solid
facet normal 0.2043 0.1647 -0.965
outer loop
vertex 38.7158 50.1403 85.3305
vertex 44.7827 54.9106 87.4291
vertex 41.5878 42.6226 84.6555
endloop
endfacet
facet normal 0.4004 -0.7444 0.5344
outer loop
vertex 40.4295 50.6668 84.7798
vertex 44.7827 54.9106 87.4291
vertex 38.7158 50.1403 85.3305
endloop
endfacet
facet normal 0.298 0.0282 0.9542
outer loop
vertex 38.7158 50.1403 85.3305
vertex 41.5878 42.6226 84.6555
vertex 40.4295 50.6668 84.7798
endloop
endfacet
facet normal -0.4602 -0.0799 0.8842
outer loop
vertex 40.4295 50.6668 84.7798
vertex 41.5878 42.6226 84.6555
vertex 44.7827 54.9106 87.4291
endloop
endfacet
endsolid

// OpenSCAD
// Auto-generated auxetic polyhedron
points = [
    [41.587840, 42.622578, 84.655544],
    [44.782667, 54.910586, 87.429125],
    [38.715839, 50.140302, 85.330507],
    [40.429495, 50.666800, 84.779780],
];

faces = [
    [0, 1, 2],
    [2, 1, 3],
    [3, 0, 2],
    [1, 0, 3],
];

polyhedron(points = points, faces = faces);
